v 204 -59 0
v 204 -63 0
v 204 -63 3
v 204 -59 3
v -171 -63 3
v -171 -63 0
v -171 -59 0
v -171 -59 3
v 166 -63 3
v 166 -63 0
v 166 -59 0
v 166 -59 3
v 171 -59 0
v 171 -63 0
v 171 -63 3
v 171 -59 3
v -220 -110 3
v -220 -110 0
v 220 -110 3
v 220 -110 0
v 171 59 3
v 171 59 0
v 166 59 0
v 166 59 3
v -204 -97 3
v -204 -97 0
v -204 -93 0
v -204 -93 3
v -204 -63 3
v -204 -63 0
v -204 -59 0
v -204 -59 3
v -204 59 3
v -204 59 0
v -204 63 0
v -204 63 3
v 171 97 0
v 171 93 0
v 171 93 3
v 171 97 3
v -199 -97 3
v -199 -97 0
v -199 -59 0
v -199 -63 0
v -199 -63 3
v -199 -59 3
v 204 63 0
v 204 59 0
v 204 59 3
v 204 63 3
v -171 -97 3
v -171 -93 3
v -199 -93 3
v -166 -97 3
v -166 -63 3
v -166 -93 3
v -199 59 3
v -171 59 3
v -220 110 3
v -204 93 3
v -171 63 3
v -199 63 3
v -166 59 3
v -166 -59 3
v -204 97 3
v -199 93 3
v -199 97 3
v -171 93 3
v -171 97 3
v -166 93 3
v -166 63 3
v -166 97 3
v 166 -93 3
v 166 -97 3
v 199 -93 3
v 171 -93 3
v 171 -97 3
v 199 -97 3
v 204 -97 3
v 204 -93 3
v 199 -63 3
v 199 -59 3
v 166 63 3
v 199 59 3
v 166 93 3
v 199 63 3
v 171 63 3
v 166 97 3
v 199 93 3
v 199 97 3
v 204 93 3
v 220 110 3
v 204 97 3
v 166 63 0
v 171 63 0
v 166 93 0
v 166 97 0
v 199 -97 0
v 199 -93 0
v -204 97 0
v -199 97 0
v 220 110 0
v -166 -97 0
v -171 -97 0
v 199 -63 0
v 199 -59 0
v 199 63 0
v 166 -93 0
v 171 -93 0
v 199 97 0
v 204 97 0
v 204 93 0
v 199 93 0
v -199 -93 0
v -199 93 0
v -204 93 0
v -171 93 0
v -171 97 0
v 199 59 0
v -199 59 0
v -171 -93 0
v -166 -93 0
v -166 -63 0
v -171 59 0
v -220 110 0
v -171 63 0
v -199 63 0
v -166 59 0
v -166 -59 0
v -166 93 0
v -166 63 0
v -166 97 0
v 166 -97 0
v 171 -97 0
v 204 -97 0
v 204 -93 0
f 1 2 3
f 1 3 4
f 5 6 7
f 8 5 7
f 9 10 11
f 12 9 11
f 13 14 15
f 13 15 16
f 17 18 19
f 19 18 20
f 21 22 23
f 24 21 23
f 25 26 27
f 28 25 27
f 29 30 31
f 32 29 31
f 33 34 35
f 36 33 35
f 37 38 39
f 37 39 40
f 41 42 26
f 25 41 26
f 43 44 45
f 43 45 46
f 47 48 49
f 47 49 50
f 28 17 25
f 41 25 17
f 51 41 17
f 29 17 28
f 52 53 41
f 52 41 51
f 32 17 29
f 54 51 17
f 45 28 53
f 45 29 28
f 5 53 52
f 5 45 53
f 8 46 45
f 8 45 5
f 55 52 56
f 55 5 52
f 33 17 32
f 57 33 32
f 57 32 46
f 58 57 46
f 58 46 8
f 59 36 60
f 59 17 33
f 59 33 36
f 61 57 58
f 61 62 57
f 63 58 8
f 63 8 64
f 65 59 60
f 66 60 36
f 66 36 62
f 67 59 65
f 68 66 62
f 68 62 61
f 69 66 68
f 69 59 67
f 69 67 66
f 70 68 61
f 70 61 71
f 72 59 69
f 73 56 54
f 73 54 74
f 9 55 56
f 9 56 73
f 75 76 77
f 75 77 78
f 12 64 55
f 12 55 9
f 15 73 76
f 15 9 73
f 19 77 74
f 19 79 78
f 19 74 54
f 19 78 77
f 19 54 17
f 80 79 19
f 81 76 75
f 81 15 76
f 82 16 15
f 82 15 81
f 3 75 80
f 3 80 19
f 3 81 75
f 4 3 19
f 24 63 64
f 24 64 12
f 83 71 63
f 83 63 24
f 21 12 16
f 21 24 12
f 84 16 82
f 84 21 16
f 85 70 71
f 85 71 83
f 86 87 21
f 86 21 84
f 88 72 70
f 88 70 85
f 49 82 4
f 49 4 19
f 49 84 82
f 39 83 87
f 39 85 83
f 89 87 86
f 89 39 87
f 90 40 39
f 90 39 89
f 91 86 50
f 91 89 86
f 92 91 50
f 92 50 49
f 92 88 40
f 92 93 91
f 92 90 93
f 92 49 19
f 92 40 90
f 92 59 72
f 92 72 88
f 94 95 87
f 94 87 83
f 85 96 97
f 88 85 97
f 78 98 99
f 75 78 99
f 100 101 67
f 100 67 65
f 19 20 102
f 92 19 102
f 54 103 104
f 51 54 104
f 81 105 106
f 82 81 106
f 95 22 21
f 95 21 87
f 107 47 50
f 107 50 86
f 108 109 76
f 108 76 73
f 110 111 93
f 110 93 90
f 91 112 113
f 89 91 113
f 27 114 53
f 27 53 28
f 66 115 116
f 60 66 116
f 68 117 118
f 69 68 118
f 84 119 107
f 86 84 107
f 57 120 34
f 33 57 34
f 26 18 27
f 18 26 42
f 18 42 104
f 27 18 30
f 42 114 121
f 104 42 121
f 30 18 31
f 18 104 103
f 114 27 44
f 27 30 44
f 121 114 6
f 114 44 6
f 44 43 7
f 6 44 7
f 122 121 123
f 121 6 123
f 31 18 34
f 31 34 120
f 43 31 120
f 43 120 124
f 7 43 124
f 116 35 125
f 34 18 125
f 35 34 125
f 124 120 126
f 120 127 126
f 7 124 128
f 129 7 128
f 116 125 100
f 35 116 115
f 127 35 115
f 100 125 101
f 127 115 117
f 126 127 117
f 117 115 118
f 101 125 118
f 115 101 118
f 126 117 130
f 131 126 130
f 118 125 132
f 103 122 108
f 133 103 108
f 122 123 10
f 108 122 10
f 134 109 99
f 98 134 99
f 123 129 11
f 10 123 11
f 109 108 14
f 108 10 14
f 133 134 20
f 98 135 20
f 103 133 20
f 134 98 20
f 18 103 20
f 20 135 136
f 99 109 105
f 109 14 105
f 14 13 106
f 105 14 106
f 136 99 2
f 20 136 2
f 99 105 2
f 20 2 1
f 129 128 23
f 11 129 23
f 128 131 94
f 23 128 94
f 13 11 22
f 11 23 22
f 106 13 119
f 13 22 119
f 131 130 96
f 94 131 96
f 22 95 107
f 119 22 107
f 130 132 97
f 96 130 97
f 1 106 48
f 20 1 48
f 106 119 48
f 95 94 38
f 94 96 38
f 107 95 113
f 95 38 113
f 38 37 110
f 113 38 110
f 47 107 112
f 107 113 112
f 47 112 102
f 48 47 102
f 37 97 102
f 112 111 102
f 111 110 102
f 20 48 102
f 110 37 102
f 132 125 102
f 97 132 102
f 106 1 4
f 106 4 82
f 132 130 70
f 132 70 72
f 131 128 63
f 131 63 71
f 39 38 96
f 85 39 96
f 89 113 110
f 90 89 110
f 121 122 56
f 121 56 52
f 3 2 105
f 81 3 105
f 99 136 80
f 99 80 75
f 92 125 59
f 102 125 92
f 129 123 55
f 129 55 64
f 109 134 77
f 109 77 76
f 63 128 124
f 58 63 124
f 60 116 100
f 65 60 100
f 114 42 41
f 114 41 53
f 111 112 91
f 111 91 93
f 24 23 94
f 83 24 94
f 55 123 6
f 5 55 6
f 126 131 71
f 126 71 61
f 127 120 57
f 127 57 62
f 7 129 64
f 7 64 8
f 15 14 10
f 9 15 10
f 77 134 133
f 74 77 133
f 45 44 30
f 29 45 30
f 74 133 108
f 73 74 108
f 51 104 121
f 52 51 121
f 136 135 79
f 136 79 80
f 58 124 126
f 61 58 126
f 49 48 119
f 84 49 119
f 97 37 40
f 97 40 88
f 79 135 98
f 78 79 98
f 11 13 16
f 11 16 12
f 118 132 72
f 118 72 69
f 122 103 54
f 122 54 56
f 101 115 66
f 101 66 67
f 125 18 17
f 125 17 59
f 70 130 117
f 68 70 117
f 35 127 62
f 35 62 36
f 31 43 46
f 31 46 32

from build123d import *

# Parameters (mm, degrees)
ESQUISSE1_W             = 440
ESQUISSE1_H             = 220
BOSS_EXTRU_1_DEPTH      = 3
ESQUISSE2_W             = 5
ESQUISSE2_H             = 4
ENL_V_MAT_EXTRU_1_DEPTH = 3


with BuildPart() as part:
    # Esquisse1 → Boss.-Extru.1 (new body)
    with BuildSketch(Plane.XY):
        Rectangle(ESQUISSE1_W, ESQUISSE1_H)
    extrude(amount=BOSS_EXTRU_1_DEPTH)

    # Esquisse2 → Enlèv. mat.-Extru.1 (cut)
    with BuildSketch(Plane(origin=(0, 0, 0), x_dir=(-1, 0, 0), z_dir=(0, 0, -1))):
        with Locations((-201.5, 95)):
            Rectangle(ESQUISSE2_W, ESQUISSE2_H)
        with Locations((-168.5, 95)):
            Rectangle(ESQUISSE2_W, ESQUISSE2_H)
        with Locations((-168.5, 61)):
            Rectangle(ESQUISSE2_W, ESQUISSE2_H)
        with Locations((-201.5, 61)):
            Rectangle(ESQUISSE2_W, ESQUISSE2_H)
        with Locations((168.5, 61)):
            Rectangle(ESQUISSE2_W, ESQUISSE2_H)
        with Locations((201.5, 61)):
            Rectangle(ESQUISSE2_W, ESQUISSE2_H)
        with Locations((168.5, 95)):
            Rectangle(ESQUISSE2_W, ESQUISSE2_H)
        with Locations((201.5, 95)):
            Rectangle(ESQUISSE2_W, ESQUISSE2_H)
        with Locations((-168.5, -95)):
            Rectangle(ESQUISSE2_W, ESQUISSE2_H)
        with Locations((-201.5, -95)):
            Rectangle(ESQUISSE2_W, ESQUISSE2_H)
        with Locations((168.5, -61)):
            Rectangle(ESQUISSE2_W, ESQUISSE2_H)
        with Locations((201.5, -61)):
            Rectangle(ESQUISSE2_W, ESQUISSE2_H)
        with Locations((201.5, -95)):
            Rectangle(ESQUISSE2_W, ESQUISSE2_H)
        with Locations((168.5, -95)):
            Rectangle(ESQUISSE2_W, ESQUISSE2_H)
        with Locations((-168.5, -61)):
            Rectangle(ESQUISSE2_W, ESQUISSE2_H)
        with Locations((-201.5, -61)):
            Rectangle(ESQUISSE2_W, ESQUISSE2_H)
    extrude(amount=-ENL_V_MAT_EXTRU_1_DEPTH, mode=Mode.SUBTRACT)


solid = part.part
